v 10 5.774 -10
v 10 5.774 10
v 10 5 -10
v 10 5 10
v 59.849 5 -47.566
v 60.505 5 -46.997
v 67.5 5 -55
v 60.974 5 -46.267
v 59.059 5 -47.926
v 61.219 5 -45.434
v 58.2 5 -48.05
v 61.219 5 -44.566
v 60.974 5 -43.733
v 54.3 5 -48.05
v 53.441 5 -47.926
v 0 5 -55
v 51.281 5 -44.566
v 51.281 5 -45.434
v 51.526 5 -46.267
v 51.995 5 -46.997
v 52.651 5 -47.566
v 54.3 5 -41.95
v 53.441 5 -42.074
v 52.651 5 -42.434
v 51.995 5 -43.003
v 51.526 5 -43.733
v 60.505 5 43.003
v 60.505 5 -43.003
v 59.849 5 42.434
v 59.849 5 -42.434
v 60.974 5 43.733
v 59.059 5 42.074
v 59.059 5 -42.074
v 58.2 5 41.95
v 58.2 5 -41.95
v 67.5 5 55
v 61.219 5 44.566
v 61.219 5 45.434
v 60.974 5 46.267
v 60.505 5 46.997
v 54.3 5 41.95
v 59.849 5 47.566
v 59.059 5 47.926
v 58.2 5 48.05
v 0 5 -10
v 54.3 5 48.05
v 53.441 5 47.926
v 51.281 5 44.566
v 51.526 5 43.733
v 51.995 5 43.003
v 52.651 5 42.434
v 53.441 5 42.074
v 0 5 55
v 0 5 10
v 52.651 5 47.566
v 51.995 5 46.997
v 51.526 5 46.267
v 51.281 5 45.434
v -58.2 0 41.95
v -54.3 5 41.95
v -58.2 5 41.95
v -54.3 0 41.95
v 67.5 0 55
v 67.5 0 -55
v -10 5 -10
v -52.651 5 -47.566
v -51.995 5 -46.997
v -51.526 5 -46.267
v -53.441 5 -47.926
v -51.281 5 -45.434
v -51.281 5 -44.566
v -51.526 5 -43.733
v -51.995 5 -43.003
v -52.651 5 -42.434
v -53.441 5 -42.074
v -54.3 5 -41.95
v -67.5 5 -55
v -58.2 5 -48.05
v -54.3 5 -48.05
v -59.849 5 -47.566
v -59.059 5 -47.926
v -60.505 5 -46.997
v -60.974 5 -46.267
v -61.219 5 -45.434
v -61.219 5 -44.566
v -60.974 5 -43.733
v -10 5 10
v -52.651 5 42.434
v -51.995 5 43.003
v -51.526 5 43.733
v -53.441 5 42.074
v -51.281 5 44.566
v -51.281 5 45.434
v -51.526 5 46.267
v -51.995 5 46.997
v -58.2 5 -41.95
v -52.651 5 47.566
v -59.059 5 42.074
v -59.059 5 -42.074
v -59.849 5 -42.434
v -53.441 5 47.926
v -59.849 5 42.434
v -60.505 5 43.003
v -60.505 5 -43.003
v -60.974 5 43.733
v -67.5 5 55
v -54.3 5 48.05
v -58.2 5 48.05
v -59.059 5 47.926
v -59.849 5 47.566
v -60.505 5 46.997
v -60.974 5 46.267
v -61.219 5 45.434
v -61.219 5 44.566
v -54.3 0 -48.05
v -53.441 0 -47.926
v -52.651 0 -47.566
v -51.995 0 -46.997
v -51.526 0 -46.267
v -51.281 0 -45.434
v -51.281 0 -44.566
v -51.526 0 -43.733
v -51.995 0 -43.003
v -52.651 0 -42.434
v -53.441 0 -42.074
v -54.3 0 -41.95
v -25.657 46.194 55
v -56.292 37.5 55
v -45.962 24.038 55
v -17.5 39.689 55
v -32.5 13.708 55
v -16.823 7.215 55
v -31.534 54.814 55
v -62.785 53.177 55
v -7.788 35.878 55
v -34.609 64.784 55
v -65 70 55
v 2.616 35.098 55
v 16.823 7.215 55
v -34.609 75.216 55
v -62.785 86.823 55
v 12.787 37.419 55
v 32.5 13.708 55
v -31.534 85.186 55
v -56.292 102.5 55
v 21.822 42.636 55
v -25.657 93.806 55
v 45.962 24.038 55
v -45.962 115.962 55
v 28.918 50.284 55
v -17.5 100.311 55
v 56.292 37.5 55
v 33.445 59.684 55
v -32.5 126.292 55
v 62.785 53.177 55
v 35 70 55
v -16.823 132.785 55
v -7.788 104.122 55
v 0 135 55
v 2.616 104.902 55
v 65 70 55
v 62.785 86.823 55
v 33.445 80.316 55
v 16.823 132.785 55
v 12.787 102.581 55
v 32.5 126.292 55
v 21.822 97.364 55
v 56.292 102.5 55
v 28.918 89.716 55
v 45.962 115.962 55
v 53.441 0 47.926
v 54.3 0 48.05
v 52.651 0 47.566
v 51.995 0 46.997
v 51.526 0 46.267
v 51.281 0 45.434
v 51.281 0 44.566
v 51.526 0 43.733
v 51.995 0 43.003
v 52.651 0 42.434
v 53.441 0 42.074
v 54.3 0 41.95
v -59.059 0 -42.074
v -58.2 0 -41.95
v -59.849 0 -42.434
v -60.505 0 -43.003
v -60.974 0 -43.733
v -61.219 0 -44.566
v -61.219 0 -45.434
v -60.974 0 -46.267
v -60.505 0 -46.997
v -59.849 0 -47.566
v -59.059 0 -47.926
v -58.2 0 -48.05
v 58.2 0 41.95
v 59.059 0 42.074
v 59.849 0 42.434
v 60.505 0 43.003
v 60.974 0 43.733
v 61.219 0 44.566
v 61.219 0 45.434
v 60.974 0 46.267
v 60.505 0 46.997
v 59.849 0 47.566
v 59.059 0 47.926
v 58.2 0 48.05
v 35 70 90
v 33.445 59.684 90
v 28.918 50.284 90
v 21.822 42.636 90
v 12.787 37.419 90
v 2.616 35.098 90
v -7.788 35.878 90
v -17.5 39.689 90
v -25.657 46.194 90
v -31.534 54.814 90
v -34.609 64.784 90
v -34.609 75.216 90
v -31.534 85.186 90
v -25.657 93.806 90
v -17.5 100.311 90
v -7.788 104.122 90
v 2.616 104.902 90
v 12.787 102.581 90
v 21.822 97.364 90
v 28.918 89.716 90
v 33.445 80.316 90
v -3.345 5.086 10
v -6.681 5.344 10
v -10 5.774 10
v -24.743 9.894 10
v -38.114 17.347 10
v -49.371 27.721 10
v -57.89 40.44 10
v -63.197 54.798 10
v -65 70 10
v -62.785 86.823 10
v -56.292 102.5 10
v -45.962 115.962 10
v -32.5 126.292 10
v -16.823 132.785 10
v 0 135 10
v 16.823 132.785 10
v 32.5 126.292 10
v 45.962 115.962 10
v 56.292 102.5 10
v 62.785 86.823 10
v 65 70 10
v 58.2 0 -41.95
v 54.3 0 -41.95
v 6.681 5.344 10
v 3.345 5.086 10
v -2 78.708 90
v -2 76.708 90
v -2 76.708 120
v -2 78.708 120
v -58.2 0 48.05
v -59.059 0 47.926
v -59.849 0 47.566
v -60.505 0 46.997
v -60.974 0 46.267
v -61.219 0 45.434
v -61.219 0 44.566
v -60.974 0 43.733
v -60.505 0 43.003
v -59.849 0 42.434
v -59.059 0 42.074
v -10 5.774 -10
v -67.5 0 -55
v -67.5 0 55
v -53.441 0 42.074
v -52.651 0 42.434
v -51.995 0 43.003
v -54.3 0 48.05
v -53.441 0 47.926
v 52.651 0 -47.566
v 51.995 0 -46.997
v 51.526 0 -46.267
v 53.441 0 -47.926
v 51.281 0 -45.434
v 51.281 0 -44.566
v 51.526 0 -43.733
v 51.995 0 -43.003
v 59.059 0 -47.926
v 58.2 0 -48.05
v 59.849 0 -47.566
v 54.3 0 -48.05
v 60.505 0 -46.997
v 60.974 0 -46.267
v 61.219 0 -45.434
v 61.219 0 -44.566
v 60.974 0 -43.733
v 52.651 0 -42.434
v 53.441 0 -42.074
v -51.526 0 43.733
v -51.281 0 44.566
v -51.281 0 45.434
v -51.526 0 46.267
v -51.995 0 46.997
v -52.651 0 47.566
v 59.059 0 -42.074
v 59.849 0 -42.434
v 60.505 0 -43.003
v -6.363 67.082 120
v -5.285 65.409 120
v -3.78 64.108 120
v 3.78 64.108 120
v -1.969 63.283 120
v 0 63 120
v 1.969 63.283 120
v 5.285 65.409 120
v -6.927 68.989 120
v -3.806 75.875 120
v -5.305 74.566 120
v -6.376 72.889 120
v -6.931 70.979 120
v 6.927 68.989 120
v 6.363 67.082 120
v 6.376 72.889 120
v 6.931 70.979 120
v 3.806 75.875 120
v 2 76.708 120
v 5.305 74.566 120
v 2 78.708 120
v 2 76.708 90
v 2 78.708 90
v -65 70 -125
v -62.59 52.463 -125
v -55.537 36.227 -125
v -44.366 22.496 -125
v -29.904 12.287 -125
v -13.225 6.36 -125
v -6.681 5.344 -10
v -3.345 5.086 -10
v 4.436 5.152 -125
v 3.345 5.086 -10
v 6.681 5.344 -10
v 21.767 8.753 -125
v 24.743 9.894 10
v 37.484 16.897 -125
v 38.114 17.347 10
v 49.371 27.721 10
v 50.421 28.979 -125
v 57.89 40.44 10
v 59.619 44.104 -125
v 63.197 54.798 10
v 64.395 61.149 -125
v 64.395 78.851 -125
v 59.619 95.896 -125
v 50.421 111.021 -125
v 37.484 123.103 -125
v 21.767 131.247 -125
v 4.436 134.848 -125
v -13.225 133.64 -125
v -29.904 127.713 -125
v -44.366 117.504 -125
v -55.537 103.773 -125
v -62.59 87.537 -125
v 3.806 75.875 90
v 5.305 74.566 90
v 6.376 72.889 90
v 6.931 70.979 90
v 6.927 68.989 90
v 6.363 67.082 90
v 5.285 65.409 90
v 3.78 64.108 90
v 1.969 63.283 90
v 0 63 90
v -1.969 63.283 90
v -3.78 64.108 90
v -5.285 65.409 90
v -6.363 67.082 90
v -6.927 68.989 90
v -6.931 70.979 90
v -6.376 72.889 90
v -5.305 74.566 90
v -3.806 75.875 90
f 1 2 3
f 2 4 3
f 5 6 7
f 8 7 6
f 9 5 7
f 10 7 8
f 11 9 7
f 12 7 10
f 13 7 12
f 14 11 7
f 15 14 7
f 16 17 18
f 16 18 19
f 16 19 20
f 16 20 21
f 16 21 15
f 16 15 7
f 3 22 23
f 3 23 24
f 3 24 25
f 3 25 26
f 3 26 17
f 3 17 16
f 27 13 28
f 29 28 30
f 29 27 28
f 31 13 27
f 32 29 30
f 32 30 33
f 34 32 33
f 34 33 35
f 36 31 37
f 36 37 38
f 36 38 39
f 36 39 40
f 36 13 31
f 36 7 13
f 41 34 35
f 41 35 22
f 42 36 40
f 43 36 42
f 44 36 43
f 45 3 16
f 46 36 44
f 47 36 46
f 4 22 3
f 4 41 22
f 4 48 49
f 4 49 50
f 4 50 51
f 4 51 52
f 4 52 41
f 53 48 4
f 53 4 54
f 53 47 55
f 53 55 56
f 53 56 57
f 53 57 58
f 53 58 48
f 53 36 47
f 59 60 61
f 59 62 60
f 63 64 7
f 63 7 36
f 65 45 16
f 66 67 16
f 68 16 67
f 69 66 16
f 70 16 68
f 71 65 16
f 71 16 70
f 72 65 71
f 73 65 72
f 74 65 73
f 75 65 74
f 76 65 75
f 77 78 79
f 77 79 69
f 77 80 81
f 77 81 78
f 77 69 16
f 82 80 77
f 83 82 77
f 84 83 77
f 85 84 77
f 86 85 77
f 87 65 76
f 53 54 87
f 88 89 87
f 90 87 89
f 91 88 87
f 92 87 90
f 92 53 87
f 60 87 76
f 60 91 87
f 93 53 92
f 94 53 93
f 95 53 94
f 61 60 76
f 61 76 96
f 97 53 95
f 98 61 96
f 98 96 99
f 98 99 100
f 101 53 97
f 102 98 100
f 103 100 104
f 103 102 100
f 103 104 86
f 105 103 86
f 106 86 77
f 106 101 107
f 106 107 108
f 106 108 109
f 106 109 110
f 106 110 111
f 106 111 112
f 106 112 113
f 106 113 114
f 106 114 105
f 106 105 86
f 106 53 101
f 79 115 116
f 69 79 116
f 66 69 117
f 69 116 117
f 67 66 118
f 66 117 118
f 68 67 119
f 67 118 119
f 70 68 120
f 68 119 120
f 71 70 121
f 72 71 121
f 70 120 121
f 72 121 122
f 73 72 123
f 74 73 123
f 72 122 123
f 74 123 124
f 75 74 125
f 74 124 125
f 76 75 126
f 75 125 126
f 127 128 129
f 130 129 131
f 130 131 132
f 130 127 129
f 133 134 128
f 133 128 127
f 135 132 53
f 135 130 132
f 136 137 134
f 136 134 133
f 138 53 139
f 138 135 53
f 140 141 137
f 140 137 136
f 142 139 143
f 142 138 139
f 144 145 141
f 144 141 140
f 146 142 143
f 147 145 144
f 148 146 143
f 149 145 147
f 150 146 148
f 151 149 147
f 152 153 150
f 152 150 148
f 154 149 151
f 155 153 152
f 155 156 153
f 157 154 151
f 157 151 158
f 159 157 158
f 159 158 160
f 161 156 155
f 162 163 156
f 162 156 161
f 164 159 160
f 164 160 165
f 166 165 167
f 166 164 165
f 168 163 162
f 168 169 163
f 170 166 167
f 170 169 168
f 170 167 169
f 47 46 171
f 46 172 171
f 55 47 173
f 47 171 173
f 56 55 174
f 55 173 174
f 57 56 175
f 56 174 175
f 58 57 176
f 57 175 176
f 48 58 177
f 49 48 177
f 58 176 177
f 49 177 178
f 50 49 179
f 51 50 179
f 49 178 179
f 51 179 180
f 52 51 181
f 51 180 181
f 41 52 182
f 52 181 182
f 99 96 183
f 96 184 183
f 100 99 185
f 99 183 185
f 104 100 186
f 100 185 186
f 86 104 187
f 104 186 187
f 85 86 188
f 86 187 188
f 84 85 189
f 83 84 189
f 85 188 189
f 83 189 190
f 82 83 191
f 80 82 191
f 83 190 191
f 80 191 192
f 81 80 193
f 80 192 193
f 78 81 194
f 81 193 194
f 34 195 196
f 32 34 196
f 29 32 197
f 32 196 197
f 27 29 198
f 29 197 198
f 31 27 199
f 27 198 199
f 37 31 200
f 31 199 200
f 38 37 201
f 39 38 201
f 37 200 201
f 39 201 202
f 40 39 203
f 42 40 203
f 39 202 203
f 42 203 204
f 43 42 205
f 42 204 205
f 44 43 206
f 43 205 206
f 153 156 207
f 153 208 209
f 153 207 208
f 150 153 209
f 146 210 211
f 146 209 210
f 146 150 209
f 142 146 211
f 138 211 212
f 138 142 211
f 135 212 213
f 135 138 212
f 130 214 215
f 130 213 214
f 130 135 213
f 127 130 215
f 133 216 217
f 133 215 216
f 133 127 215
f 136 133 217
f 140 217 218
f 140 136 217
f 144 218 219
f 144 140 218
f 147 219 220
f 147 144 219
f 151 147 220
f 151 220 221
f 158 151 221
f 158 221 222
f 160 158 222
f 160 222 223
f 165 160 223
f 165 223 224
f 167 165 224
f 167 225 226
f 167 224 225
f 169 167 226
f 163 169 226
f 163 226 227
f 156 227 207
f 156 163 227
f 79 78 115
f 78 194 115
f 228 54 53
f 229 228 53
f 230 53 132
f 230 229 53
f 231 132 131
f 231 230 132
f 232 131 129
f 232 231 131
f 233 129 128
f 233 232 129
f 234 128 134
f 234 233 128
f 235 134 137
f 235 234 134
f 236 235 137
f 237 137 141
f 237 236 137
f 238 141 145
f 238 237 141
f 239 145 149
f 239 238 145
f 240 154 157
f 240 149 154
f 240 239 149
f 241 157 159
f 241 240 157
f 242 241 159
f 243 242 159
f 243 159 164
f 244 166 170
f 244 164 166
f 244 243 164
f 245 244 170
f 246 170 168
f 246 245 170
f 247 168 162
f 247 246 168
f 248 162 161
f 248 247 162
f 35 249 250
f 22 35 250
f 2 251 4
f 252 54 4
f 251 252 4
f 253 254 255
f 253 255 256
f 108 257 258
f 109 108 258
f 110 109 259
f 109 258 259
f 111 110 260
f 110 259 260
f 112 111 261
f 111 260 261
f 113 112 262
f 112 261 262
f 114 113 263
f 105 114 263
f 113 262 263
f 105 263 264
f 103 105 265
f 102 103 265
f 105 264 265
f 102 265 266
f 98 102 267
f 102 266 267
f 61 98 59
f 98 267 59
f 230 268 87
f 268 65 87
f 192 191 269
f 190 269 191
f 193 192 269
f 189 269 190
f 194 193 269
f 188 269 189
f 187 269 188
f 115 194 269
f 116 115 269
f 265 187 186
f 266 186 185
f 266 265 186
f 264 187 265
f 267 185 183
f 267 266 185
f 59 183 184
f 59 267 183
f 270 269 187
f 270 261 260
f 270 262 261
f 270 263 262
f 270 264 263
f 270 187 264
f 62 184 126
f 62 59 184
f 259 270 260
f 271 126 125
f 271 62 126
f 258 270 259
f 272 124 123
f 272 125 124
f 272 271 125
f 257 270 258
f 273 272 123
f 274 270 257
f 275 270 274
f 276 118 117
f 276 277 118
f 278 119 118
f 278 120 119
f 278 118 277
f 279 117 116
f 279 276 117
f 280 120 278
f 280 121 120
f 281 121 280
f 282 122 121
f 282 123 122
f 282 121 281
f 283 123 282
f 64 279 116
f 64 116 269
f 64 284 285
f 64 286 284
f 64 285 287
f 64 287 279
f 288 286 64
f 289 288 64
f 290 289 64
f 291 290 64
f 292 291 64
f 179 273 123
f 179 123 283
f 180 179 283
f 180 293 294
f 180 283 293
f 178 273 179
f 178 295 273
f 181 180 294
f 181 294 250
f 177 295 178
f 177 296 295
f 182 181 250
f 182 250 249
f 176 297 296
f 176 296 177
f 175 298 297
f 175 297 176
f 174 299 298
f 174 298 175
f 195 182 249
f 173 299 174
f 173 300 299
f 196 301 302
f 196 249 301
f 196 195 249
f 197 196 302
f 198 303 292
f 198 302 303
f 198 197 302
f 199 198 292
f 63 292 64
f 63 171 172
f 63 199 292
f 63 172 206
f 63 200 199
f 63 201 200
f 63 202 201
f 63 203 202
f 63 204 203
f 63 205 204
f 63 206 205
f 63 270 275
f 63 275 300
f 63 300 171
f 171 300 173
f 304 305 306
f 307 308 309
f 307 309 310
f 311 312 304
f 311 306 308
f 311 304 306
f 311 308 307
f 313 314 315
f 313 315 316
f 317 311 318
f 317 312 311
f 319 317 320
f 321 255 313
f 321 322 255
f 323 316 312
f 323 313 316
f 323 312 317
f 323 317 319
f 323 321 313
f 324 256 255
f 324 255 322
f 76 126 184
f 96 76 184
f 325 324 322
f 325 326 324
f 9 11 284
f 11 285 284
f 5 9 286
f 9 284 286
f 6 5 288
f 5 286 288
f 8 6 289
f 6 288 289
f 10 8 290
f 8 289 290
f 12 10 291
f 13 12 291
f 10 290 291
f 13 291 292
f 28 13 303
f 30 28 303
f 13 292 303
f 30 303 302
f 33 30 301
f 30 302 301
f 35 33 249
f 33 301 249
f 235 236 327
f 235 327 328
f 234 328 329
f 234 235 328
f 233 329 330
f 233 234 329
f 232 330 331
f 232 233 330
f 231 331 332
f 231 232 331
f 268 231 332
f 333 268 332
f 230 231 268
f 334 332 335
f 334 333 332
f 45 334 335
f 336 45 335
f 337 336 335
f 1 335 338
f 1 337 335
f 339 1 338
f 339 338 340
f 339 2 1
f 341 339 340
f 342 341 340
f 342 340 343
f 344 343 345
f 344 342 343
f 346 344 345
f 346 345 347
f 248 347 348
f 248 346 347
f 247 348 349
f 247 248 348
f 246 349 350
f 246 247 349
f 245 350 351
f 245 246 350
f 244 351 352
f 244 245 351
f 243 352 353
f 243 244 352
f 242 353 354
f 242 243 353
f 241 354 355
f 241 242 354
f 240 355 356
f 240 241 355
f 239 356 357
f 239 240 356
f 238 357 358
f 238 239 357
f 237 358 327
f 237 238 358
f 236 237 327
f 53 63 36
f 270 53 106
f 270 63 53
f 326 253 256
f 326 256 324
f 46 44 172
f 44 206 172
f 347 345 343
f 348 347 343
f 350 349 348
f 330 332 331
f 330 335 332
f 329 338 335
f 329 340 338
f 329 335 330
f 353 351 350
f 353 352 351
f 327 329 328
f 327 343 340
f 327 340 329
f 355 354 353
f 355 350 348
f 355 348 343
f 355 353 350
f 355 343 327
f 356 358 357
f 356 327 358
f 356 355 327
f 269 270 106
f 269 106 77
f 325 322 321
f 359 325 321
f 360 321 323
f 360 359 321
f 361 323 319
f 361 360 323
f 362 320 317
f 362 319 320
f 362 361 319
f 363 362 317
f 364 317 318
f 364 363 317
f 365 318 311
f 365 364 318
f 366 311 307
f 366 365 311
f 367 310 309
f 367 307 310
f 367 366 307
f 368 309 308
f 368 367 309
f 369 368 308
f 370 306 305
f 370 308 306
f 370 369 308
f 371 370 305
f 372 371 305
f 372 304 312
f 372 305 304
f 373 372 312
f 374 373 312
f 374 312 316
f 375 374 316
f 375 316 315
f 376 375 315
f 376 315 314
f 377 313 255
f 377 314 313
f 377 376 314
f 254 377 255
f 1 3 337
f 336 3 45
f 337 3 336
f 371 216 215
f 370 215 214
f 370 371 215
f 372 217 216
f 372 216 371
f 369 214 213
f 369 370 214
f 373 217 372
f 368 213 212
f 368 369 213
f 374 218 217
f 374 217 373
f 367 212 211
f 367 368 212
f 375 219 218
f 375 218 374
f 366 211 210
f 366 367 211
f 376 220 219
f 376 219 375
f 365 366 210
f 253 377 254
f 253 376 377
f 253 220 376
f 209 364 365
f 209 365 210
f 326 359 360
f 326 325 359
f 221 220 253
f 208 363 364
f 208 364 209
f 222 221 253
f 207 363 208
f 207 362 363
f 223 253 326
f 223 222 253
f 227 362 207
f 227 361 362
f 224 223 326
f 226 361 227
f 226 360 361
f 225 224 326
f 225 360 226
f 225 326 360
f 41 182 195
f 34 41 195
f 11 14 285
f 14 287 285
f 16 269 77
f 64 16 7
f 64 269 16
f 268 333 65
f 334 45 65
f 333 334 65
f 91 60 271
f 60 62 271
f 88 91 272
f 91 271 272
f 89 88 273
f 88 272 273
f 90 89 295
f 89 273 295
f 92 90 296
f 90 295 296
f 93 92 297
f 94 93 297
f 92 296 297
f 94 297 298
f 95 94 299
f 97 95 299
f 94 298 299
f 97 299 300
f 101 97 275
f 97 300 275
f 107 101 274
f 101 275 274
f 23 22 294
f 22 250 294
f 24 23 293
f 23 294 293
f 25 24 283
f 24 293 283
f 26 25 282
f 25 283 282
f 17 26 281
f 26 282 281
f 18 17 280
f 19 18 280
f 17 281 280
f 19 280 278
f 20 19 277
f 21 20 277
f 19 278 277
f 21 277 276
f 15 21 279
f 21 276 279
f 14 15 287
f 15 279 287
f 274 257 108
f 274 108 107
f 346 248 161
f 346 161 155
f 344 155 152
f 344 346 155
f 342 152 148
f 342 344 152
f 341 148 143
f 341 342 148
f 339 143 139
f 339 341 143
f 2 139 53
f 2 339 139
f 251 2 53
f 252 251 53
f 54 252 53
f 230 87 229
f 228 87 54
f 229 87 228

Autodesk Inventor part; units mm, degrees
ref_plane "YZ Plane" through (0, 0, 0) normal (1, 0, 0) x (0, 1, 0)
ref_plane "XZ Plane" through (0, 0, 0) normal (0, 1, 0) x (-1, 0, 0)
ref_plane "XY Plane" through (0, 0, 0) normal (0, 0, 1) x (1, 0, 0)
sketch "Sketch1" plane through (0, 0, 0) normal (0, 1, 0) x (-1, 0, 0)
  line L0 (-70.0685, 0) -> (70.0685, 0) construction
  line L1 (0, -20.6438) -> (0, 20.6438) construction
  line L2 (67.5, -55) -> (-67.5, -55)
  line L3 (-67.5, -55) -> (-67.5, 55)
  line L4 (-67.5, 55) -> (67.5, 55)
  line L5 (67.5, 55) -> (67.5, -55)
  point P0 (0, 0)
  point P1 (0, 0)
  dimension "d0" = 110
  dimension "d1" = 135
extrude "Extrusion1" add sketch "Sketch1" along normal blind 5
sketch "Sketch2" plane through (0, 0, 0) normal (0, -1, 0) x (1, 0, 0)
  line L0 (-161.783, 0) -> (161.783, 0) construction
  line L1 (0, 8.6003) -> (0, -8.6003) construction
  line L2 (-58.2, 45) -> (-54.3, 45) construction
  line L3 (-58.2, 48.05) -> (-54.3, 48.05)
  line L4 (-54.3, 41.95) -> (-58.2, 41.95)
  arc A0 (-58.2, 48.05) -> (-58.2, 41.95) centre (-58.2, 45) ccw
  arc A1 (-54.3, 41.95) -> (-54.3, 48.05) centre (-54.3, 45) ccw
  line L5 (58.2, 45) -> (54.3, 45) construction
  line L6 (58.2, 48.05) -> (54.3, 48.05)
  line L7 (54.3, 41.95) -> (58.2, 41.95)
  arc A2 (58.2, 41.95) -> (58.2, 48.05) centre (58.2, 45) ccw
  arc A3 (54.3, 48.05) -> (54.3, 41.95) centre (54.3, 45) ccw
  line L8 (58.2, -45) -> (54.3, -45) construction
  line L9 (58.2, -41.95) -> (54.3, -41.95)
  line L10 (54.3, -48.05) -> (58.2, -48.05)
  arc A4 (58.2, -48.05) -> (58.2, -41.95) centre (58.2, -45) ccw
  arc A5 (54.3, -41.95) -> (54.3, -48.05) centre (54.3, -45) ccw
  line L11 (-58.2, -45) -> (-54.3, -45) construction
  line L12 (-58.2, -48.05) -> (-54.3, -48.05)
  line L13 (-54.3, -41.95) -> (-58.2, -41.95)
  arc A6 (-58.2, -41.95) -> (-58.2, -48.05) centre (-58.2, -45) ccw
  arc A7 (-54.3, -48.05) -> (-54.3, -41.95) centre (-54.3, -45) ccw
  point P0 (0, 0)
  point P1 (-56.25, 45)
  point P2 (56.25, 45)
  point P3 (56.25, -45)
  point P4 (-56.25, -45)
  point P5 (0, 0)
  point P6 (-61.25, 45)
  point P7 (-51.25, 45)
  dimension "d4" = 112.5
  dimension "d5" = 90
  dimension "d7" = 6.1
  dimension "d8" = 10
extrude "Extrusion2" cut sketch "Sketch2" against normal through all
sketch "Sketch3" plane through (0, 0, 0) normal (0, -1, 0) x (1, 0, 0)
  line L0 (-38.6076, 0) -> (38.6076, 0) construction
  line L1 (0, -3.4177) -> (0, 3.4177) construction
  line L2 (10, -10) -> (-10, -10)
  line L3 (-10, -10) -> (-10, 10)
  line L4 (-10, 10) -> (10, 10)
  line L5 (10, 10) -> (10, -10)
  point P0 (0, 0)
  point P1 (0, 0)
  dimension "d11" = 20
  dimension "d12" = 20
extrude "Extrusion3" add sketch "Sketch3" against normal blind 70
sketch "Sketch4" plane through (-10, 5, 10) normal (0, 0, 1) x (1, 0, 0)
  line L0 (20, 65) -> (0, 65) projected
  circle A0 centre (10, 65) radius 65
  point P0 (10, -5)
  dimension "d15" = 130
extrude "Extrusion4" add sketch "Sketch4" along normal up to surface (45 mm away)
sketch "Sketch5" plane through (0, 70, 55) normal (0, 0, 1) x (1, 0, 0)
  line L0 (10, 0) -> (-10, 0) projected
  circle A0 centre (0, 0) radius 35
  point P0 (0, -70)
  dimension "d18" = 70
extrude "Extrusion5" add sketch "Sketch5" along normal blind 35
sketch "Sketch6" plane through (0, 70, 90) normal (0, 0, 1) x (1, 0, 0)
  arc A0 (-2, 6.7082) -> (2, 6.7082) centre (0, 0) ccw
  circle A1 centre (0, 0) radius 35 projected
  line L0 (-2, 8.7082) -> (2, 8.7082)
  line L1 (2, 8.7082) -> (2, 6.7082)
  line L2 (-2, 6.7082) -> (-2, 8.7082)
  point P0 (0, -70)
  dimension "d21" = 14
  dimension "d23" = 2
  dimension "d26" = 4
  dimension "d27" = 2
extrude "Extrusion6" add sketch "Sketch6" along normal blind 30 contours L2 L0 L1 A0
sketch "Sketch8" plane through (-10, 5, 10) normal (0, 0, -1) x (-1, 0, 0)
  arc A0 (-12, 71.7082) -> (-8, 71.7082) centre (-10, 65) ccw projected
  circle A1 centre (-10, 65) radius 65
  arc A2 (0, 0.7738) -> (-20, 0.7738) centre (-10, 65) ccw projected
  point P0 (-10, -5)
extrude "Extrusion7" add sketch "Sketch8" along normal blind 135
properties part number "MotorV1"
